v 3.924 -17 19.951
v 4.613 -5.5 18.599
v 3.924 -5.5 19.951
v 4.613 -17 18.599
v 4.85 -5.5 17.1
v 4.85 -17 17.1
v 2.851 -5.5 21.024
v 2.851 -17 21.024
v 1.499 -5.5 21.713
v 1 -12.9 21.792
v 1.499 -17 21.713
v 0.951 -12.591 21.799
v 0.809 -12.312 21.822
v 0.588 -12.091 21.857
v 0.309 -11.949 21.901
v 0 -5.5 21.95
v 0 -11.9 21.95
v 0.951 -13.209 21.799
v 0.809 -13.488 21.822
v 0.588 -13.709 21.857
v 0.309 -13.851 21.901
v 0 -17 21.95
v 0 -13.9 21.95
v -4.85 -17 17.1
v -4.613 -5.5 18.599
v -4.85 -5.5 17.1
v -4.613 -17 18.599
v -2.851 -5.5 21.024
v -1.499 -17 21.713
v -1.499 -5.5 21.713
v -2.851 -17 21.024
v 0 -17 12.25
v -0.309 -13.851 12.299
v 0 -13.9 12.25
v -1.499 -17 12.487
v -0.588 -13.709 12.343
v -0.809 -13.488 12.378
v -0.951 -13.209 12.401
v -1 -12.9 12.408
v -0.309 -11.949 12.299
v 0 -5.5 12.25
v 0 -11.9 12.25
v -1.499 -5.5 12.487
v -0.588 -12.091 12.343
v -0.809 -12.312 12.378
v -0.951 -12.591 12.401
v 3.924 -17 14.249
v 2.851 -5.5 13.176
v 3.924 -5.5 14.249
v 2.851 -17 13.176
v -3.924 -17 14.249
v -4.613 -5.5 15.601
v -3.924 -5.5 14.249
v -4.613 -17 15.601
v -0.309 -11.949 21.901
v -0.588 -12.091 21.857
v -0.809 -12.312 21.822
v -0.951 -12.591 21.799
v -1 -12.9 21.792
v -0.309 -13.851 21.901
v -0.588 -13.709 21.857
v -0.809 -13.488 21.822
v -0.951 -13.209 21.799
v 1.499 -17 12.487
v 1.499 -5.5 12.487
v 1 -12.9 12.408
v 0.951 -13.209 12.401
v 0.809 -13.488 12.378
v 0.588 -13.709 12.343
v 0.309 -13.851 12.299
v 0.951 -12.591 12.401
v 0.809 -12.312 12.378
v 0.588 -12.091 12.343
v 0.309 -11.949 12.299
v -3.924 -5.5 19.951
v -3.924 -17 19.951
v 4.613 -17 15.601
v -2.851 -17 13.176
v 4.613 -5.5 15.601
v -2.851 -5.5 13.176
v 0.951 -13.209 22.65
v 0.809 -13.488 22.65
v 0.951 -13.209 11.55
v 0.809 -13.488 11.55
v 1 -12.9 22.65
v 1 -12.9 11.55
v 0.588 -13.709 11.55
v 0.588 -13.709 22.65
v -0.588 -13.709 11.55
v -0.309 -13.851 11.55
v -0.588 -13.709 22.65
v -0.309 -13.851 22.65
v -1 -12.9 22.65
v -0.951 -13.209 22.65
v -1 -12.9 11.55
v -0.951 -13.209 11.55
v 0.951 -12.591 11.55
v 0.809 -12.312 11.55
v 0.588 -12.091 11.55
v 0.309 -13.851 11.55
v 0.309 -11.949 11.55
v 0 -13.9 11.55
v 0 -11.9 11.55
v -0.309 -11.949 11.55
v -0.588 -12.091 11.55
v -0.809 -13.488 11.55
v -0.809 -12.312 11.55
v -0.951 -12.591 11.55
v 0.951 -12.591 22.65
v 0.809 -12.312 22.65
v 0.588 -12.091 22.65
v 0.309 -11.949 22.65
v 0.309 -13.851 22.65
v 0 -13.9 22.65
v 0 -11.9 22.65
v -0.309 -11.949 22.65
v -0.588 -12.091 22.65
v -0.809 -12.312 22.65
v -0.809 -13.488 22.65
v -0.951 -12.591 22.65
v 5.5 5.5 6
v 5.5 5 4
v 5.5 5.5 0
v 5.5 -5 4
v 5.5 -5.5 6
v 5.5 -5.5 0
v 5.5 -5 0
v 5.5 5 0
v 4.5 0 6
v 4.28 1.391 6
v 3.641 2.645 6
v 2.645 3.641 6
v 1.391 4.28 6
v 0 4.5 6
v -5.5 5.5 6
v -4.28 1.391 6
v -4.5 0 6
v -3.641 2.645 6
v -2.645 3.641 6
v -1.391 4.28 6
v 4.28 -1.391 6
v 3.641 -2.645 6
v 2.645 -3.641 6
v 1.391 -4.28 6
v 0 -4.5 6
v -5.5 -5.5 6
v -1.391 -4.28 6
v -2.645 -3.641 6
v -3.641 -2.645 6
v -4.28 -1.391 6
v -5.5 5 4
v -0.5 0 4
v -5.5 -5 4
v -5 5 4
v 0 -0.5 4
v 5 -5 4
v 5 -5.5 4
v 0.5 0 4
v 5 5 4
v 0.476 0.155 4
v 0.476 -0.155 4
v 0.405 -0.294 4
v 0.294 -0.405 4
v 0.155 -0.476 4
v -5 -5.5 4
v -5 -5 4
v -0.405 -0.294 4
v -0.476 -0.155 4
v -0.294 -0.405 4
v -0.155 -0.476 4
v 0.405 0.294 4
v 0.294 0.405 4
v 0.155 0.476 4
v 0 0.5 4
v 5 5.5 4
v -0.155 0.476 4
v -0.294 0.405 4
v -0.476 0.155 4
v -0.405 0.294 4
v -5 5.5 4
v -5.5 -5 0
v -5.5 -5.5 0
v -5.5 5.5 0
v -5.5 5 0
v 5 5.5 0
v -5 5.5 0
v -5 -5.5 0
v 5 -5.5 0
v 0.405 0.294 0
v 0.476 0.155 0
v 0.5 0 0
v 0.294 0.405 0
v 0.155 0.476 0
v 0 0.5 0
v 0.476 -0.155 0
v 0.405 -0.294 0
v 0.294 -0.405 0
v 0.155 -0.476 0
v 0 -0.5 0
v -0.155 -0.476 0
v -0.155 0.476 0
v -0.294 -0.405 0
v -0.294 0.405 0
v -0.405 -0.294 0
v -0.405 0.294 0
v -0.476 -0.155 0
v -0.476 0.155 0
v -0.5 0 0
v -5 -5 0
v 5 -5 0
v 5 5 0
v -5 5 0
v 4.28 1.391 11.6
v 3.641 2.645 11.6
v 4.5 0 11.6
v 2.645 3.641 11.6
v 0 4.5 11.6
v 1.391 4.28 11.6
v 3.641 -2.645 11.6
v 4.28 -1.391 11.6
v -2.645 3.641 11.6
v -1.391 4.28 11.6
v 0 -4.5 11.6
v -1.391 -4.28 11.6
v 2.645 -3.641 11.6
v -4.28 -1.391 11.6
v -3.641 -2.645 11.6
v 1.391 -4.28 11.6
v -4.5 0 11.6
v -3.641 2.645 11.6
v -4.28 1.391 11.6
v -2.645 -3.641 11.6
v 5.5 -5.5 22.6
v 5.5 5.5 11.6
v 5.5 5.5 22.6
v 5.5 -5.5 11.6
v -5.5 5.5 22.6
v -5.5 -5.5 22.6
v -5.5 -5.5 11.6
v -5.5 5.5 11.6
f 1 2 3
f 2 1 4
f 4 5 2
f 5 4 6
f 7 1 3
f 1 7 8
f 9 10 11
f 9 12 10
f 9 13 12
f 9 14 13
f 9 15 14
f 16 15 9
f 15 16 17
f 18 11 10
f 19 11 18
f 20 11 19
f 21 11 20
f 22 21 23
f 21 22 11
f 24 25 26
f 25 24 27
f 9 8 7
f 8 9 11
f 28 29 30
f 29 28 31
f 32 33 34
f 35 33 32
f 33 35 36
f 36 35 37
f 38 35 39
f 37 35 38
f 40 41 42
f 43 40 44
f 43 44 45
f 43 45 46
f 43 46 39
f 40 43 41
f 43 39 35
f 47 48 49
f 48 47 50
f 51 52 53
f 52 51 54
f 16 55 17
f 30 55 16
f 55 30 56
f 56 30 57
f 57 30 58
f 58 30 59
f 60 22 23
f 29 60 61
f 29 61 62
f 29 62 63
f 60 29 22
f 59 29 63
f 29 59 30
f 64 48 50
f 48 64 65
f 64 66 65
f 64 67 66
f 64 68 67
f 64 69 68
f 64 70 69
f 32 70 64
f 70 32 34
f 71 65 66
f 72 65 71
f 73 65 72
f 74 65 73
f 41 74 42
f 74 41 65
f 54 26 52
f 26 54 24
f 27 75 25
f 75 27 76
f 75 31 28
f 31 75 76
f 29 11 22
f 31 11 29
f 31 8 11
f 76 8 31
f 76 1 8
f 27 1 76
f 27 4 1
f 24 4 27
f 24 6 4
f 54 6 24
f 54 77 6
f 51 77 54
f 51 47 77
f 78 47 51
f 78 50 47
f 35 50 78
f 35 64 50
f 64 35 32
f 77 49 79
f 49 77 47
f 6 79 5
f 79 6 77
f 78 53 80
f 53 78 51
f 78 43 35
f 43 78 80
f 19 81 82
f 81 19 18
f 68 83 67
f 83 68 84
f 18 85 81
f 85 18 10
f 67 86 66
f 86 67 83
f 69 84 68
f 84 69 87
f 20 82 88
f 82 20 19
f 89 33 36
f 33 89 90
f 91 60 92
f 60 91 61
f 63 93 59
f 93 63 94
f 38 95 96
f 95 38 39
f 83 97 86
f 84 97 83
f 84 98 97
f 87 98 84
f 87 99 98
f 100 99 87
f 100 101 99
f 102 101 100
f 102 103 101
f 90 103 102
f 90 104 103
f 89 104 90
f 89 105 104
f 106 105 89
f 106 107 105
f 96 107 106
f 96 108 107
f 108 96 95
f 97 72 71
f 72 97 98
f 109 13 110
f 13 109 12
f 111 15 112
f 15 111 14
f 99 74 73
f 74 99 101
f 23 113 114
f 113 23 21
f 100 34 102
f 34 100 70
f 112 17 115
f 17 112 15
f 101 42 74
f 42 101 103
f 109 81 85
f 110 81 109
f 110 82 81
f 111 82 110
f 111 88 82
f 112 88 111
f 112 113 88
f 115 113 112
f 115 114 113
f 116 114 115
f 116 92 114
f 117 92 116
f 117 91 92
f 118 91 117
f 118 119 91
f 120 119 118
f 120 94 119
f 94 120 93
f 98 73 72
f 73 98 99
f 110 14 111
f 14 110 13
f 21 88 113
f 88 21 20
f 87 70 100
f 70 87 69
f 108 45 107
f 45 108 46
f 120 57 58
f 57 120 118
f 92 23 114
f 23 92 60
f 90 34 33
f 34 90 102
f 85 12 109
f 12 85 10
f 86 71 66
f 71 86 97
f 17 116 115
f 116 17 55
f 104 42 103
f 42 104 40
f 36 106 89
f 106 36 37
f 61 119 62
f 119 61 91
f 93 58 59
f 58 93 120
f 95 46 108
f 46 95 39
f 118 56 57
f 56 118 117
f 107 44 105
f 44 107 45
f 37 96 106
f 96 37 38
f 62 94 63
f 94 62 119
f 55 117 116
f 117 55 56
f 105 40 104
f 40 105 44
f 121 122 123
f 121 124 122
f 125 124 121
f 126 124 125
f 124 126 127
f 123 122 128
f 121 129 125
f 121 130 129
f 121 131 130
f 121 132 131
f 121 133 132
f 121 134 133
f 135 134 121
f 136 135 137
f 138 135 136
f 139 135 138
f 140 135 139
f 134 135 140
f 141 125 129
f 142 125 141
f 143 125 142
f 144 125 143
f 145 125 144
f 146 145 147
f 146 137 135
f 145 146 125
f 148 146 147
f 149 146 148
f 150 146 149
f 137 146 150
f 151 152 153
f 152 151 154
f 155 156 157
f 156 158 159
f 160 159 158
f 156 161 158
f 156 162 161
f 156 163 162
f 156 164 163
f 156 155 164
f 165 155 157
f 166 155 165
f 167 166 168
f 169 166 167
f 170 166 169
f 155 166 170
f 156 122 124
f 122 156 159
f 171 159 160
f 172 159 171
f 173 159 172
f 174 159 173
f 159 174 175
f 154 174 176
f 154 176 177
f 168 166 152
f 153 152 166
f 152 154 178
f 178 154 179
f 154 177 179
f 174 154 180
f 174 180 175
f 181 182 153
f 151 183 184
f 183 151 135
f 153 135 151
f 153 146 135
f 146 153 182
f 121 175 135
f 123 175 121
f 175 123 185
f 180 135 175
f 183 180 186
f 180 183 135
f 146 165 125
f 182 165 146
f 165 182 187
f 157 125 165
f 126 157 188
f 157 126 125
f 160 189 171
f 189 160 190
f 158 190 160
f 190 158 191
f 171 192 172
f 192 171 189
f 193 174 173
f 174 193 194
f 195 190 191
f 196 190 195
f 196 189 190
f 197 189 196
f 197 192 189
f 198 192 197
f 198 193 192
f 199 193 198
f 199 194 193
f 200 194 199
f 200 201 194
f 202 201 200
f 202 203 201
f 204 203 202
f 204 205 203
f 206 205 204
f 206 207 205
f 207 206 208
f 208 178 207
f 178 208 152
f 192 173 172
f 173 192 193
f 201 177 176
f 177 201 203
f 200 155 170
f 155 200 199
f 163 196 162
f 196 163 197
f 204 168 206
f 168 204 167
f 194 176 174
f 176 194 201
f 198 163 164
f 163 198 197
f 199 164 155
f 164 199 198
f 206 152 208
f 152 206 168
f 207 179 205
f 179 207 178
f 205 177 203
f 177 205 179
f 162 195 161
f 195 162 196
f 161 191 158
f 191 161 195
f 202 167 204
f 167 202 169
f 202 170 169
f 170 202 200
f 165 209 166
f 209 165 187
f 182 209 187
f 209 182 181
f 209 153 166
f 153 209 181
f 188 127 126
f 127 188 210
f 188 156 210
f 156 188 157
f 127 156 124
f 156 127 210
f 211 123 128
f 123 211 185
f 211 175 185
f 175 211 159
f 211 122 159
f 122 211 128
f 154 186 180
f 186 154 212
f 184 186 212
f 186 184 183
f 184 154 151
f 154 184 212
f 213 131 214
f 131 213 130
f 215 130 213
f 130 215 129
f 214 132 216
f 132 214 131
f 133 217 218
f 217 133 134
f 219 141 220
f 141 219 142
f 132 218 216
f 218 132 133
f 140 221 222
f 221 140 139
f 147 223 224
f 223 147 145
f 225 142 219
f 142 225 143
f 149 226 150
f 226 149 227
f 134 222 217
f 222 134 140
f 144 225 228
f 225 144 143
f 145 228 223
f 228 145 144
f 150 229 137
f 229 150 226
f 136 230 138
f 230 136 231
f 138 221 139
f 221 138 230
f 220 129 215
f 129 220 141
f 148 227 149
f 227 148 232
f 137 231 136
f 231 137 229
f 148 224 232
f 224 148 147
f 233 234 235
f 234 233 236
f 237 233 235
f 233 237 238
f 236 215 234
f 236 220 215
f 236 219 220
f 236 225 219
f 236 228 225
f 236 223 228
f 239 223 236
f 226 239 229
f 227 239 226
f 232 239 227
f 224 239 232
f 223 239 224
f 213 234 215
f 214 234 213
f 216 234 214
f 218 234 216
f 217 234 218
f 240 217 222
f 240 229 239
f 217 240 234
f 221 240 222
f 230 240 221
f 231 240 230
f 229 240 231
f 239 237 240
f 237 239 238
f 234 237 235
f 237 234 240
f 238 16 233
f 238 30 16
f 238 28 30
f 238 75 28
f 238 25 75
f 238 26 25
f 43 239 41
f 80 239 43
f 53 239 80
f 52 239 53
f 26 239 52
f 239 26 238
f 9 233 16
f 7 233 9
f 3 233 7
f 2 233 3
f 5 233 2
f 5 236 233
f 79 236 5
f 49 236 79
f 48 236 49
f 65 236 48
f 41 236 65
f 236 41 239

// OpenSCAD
$fn=20;
translate( [-5.5, -5.5, 4])
    cube( [11,11,2]);
cylinder( 4, 0.5, 0.5);
translate( [-5.5, -5.5, 0])
        cube( [.5, .5, 4]);
translate( [5, -5.5, 0])
        cube( [.5, .5, 4]);
translate( [5, 5, 0])
        cube( [.5, .5, 4]);
translate( [-5.5, 5, 0])
        cube( [.5, .5, 4]);
translate([0, 0, 6])
    cylinder( 11.1, 4.5, 4.5);
translate( [-5.5, -5.5, 17.1-11/2])
    cube( [11, 11, 11]);
translate( [0, 0, 17.1]) {
  rotate( [90, 0, 0]) {
    cylinder( 17, 9.7/2, 9.7/2);
    translate( [0, 5.55, 12.9])
      rotate([90, 0, 0])
    cylinder( 11.1, 1, 1);
  }
}
